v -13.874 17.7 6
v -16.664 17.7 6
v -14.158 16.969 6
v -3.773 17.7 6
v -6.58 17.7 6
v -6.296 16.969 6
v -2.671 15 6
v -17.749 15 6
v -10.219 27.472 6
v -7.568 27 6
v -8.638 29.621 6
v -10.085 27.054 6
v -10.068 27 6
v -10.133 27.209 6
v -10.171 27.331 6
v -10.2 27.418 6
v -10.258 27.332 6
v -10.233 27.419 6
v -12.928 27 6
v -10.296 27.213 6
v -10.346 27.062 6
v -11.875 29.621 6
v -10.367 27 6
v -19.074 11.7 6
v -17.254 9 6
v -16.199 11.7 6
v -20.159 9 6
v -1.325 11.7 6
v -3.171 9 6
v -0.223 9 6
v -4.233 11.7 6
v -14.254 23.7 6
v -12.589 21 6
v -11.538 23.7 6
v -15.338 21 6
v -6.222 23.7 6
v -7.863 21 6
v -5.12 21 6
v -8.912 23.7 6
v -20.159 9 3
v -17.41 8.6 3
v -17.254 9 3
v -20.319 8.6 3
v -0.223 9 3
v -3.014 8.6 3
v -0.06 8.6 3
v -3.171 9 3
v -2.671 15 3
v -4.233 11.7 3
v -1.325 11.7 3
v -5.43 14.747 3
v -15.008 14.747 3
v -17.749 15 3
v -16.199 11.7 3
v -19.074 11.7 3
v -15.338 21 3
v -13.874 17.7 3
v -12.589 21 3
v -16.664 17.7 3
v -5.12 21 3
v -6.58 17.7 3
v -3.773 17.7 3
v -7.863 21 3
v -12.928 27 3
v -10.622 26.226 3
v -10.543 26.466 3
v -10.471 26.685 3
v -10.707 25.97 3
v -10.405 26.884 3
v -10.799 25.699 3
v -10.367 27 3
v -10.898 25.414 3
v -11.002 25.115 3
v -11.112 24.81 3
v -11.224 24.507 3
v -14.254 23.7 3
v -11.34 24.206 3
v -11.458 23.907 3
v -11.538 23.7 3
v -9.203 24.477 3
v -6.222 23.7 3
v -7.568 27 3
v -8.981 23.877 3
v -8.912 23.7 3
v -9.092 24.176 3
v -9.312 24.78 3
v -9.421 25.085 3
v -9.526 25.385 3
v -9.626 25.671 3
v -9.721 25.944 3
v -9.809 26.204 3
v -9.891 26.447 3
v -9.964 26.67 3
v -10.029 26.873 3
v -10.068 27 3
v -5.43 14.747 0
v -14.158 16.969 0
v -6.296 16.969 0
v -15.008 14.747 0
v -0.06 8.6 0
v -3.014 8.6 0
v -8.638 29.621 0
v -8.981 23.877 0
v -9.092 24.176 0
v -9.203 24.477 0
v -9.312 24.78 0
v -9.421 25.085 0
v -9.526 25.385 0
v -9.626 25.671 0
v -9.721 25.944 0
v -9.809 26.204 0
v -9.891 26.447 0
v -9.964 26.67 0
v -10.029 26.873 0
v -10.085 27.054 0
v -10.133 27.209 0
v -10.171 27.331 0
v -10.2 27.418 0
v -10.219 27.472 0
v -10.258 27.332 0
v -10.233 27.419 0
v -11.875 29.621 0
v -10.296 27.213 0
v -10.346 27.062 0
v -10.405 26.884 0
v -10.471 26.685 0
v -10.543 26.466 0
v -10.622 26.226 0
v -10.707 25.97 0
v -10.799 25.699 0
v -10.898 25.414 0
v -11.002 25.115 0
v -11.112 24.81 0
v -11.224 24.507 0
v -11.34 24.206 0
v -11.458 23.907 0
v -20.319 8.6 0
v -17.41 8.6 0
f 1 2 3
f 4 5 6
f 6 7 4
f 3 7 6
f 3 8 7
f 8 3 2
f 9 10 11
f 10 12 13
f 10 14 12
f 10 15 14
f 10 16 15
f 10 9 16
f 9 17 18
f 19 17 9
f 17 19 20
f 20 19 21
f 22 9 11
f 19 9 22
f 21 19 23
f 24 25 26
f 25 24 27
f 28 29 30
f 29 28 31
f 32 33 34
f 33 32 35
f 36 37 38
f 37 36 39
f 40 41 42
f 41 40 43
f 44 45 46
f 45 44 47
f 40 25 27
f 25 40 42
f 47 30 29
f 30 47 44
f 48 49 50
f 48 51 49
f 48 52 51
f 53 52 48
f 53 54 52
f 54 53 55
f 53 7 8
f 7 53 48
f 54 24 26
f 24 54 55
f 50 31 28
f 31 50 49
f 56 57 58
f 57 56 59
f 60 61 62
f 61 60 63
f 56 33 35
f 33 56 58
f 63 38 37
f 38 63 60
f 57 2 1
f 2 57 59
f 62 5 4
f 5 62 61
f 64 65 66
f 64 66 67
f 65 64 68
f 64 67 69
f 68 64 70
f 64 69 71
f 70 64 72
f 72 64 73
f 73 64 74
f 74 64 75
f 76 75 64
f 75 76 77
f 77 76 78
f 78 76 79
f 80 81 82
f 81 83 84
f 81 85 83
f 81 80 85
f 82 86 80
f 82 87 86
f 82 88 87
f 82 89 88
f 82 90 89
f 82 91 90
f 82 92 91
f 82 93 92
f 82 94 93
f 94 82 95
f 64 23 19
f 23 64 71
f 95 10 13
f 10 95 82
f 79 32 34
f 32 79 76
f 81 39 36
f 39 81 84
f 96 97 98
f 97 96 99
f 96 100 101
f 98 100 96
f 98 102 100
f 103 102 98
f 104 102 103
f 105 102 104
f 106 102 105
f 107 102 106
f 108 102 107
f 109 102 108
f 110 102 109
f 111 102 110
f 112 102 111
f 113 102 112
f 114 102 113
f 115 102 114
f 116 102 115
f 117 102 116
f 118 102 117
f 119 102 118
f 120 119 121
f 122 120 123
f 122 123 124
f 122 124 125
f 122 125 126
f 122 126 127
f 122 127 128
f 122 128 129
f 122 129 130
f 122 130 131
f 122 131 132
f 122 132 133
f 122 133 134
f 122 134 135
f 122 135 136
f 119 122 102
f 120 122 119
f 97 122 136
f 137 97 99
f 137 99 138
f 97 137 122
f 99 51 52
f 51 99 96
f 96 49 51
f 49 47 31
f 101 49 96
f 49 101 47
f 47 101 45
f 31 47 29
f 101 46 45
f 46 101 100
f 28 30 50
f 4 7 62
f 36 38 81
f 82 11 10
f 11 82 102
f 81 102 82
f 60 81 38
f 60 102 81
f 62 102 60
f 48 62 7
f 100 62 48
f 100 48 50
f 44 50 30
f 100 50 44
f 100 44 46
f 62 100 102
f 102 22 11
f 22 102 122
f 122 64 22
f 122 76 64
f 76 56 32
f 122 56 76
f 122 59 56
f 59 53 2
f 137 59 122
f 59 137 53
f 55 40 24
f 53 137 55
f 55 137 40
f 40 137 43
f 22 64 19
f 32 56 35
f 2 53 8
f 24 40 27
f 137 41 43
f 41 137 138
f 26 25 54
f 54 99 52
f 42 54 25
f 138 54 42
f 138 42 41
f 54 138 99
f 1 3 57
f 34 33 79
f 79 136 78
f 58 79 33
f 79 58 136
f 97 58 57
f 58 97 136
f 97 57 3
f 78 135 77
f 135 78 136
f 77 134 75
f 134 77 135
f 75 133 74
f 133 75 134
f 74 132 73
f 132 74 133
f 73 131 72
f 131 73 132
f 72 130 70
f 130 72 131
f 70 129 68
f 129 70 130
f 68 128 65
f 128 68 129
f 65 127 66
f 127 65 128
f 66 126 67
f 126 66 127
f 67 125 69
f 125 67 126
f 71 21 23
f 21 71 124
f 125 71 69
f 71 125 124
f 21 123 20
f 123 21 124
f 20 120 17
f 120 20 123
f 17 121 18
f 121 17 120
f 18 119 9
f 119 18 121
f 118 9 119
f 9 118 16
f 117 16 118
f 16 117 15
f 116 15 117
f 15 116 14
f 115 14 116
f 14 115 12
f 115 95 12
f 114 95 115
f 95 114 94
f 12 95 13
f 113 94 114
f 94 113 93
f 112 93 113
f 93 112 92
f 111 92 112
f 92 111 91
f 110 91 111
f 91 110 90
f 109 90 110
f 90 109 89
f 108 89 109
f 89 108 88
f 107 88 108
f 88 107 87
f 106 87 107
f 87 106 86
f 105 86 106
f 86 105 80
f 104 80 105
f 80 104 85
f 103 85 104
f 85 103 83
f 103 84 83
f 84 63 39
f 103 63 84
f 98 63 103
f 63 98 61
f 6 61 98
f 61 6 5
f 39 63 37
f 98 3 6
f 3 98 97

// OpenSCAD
// begin CC BY-NC-SA-4.0 licensed code (c) 2020 Anthony Roberts

// The number of lines to add to the board
board_line_count = 38; // [1:40]

// The depth (z/mm) of each line in mm
board_line_depth = 4;

// The width (y/mm) of each line in mm
board_line_width = 3;

// The width (x/mm) of the whole board
board_width = 200;

// The depth (z/mm) of the whole board
board_depth = 6;

// The width (mm) of the frame lip that keeps the board in
frame_lip_width = 10;

// The height/thickness (mm) of the lip
frame_lip_height = 1;

// The total depth (mm) of the frame
frame_height = 15;

// The thickness (mm) of the outer edges of the frame
frame_thickness = 1.2;

// The tolerances (mm) in the frame so the board isn't too tight
frame_tolerance = 0.15;

// The tolerance (mm) in the fins on the back of the letter for attaching to the board
letter_tolerance = 0.3;

// The maximum width (mm) of the letter/character fin removal lines
textWidth = 30;

// The amount (mm) to shift the letter up by to account for the underhang on the "Q"
letterUnderhangCompensation = 8.6;

// The maximum height (mm) of the letter including fins
letter_extrusion_height = 6;

// The depth (mm) of the fins on the back of the letter
letter_depth = 3;

// The font size (pt) tp use for the letter
letter_font_size = 22;

// The stl model to export (openscad only lets you export one at a time)
stl_to_export = "Ltr_A"; //[ "Board", "Frame", "Ltr_A", "Ltr_B", "Ltr_C", "Ltr_D", "Ltr_E", "Ltr_F", "Ltr_G", "Ltr_H", "Ltr_I", "Ltr_J", "Ltr_K", "Ltr_L", "Ltr_M", "Ltr_N", "Ltr_O", "Ltr_P", "Ltr_Q", "Ltr_R", "Ltr_S", "Ltr_T", "Ltr_U", "Ltr_V", "Ltr_W", "Ltr_X", "Ltr_Y", "Ltr_Z", "Ltr_1", "Ltr_2", "Ltr_3", "Ltr_4", "Ltr_5", "Ltr_6", "Ltr_7", "Ltr_8", "Ltr_9", "Ltr_0", "Ltr_.", "Ltr_!" ]

board_length = board_line_width + (board_line_count*board_line_width*2);

if(search("Board", stl_to_export) == [0, 1, 2, 3, 4]) {
    innerBoard();
} else if(search("Frame", stl_to_export) == [0, 1, 2, 3, 4]) {
    frame();
} else if(search("Ltr", stl_to_export) == [0, 1, 2]) {
    letters(stl_to_export[len(stl_to_export) - 1]);
}

module letters(letter) {    
    difference() { 
        translate([0, letterUnderhangCompensation, 0]) {
            linear_extrude(letter_extrusion_height){
                mirror([1,0,0]) {
                    text(letter,font="Liberation Sans",size=letter_font_size);
                }
            }
        }
        
        for(i=[0:1:11]) {
            translate([-textWidth, i*(board_line_width) - letter_tolerance, letter_depth]){
                if(i%2 == 0)
                    cube([textWidth, board_line_width + letter_tolerance, letter_depth]);
            }
        }
    }
}

module frame() {
    difference() {
        // Main frame cube
        cube([board_width + (2*frame_thickness), board_length + (2*frame_thickness), frame_height]);
        
        // Inner removal cube
        translate([frame_thickness + frame_tolerance, frame_thickness + frame_tolerance, frame_lip_height]) {
            cube([board_width - 2*frame_tolerance, board_length - 2*frame_tolerance, frame_height]);
        }
            
        // Lip removal cube
        translate([frame_thickness + frame_lip_width, frame_thickness + frame_lip_width, 0]) {
            cube([board_width - 2*frame_lip_width, board_length - 2*frame_lip_width, frame_height]);
        }
    }
    
    echo(str("Frame size (WxL): ",board_width + (2*frame_thickness),"x",board_length + (2*frame_thickness)));
}

module innerBoard() {

difference() {

    // Main board cube
    cube([board_width, board_length,board_depth]);

    // Line removal cubes
    for (i=[1:1:board_line_count]) {
        translate([0, 2*(i*board_line_width) - board_line_width, board_depth-board_line_depth])
            cube([board_width, board_line_width,board_line_depth]);
        }
    }

    echo(str("Board size (WxL): ",board_width,"x",board_length));

}
